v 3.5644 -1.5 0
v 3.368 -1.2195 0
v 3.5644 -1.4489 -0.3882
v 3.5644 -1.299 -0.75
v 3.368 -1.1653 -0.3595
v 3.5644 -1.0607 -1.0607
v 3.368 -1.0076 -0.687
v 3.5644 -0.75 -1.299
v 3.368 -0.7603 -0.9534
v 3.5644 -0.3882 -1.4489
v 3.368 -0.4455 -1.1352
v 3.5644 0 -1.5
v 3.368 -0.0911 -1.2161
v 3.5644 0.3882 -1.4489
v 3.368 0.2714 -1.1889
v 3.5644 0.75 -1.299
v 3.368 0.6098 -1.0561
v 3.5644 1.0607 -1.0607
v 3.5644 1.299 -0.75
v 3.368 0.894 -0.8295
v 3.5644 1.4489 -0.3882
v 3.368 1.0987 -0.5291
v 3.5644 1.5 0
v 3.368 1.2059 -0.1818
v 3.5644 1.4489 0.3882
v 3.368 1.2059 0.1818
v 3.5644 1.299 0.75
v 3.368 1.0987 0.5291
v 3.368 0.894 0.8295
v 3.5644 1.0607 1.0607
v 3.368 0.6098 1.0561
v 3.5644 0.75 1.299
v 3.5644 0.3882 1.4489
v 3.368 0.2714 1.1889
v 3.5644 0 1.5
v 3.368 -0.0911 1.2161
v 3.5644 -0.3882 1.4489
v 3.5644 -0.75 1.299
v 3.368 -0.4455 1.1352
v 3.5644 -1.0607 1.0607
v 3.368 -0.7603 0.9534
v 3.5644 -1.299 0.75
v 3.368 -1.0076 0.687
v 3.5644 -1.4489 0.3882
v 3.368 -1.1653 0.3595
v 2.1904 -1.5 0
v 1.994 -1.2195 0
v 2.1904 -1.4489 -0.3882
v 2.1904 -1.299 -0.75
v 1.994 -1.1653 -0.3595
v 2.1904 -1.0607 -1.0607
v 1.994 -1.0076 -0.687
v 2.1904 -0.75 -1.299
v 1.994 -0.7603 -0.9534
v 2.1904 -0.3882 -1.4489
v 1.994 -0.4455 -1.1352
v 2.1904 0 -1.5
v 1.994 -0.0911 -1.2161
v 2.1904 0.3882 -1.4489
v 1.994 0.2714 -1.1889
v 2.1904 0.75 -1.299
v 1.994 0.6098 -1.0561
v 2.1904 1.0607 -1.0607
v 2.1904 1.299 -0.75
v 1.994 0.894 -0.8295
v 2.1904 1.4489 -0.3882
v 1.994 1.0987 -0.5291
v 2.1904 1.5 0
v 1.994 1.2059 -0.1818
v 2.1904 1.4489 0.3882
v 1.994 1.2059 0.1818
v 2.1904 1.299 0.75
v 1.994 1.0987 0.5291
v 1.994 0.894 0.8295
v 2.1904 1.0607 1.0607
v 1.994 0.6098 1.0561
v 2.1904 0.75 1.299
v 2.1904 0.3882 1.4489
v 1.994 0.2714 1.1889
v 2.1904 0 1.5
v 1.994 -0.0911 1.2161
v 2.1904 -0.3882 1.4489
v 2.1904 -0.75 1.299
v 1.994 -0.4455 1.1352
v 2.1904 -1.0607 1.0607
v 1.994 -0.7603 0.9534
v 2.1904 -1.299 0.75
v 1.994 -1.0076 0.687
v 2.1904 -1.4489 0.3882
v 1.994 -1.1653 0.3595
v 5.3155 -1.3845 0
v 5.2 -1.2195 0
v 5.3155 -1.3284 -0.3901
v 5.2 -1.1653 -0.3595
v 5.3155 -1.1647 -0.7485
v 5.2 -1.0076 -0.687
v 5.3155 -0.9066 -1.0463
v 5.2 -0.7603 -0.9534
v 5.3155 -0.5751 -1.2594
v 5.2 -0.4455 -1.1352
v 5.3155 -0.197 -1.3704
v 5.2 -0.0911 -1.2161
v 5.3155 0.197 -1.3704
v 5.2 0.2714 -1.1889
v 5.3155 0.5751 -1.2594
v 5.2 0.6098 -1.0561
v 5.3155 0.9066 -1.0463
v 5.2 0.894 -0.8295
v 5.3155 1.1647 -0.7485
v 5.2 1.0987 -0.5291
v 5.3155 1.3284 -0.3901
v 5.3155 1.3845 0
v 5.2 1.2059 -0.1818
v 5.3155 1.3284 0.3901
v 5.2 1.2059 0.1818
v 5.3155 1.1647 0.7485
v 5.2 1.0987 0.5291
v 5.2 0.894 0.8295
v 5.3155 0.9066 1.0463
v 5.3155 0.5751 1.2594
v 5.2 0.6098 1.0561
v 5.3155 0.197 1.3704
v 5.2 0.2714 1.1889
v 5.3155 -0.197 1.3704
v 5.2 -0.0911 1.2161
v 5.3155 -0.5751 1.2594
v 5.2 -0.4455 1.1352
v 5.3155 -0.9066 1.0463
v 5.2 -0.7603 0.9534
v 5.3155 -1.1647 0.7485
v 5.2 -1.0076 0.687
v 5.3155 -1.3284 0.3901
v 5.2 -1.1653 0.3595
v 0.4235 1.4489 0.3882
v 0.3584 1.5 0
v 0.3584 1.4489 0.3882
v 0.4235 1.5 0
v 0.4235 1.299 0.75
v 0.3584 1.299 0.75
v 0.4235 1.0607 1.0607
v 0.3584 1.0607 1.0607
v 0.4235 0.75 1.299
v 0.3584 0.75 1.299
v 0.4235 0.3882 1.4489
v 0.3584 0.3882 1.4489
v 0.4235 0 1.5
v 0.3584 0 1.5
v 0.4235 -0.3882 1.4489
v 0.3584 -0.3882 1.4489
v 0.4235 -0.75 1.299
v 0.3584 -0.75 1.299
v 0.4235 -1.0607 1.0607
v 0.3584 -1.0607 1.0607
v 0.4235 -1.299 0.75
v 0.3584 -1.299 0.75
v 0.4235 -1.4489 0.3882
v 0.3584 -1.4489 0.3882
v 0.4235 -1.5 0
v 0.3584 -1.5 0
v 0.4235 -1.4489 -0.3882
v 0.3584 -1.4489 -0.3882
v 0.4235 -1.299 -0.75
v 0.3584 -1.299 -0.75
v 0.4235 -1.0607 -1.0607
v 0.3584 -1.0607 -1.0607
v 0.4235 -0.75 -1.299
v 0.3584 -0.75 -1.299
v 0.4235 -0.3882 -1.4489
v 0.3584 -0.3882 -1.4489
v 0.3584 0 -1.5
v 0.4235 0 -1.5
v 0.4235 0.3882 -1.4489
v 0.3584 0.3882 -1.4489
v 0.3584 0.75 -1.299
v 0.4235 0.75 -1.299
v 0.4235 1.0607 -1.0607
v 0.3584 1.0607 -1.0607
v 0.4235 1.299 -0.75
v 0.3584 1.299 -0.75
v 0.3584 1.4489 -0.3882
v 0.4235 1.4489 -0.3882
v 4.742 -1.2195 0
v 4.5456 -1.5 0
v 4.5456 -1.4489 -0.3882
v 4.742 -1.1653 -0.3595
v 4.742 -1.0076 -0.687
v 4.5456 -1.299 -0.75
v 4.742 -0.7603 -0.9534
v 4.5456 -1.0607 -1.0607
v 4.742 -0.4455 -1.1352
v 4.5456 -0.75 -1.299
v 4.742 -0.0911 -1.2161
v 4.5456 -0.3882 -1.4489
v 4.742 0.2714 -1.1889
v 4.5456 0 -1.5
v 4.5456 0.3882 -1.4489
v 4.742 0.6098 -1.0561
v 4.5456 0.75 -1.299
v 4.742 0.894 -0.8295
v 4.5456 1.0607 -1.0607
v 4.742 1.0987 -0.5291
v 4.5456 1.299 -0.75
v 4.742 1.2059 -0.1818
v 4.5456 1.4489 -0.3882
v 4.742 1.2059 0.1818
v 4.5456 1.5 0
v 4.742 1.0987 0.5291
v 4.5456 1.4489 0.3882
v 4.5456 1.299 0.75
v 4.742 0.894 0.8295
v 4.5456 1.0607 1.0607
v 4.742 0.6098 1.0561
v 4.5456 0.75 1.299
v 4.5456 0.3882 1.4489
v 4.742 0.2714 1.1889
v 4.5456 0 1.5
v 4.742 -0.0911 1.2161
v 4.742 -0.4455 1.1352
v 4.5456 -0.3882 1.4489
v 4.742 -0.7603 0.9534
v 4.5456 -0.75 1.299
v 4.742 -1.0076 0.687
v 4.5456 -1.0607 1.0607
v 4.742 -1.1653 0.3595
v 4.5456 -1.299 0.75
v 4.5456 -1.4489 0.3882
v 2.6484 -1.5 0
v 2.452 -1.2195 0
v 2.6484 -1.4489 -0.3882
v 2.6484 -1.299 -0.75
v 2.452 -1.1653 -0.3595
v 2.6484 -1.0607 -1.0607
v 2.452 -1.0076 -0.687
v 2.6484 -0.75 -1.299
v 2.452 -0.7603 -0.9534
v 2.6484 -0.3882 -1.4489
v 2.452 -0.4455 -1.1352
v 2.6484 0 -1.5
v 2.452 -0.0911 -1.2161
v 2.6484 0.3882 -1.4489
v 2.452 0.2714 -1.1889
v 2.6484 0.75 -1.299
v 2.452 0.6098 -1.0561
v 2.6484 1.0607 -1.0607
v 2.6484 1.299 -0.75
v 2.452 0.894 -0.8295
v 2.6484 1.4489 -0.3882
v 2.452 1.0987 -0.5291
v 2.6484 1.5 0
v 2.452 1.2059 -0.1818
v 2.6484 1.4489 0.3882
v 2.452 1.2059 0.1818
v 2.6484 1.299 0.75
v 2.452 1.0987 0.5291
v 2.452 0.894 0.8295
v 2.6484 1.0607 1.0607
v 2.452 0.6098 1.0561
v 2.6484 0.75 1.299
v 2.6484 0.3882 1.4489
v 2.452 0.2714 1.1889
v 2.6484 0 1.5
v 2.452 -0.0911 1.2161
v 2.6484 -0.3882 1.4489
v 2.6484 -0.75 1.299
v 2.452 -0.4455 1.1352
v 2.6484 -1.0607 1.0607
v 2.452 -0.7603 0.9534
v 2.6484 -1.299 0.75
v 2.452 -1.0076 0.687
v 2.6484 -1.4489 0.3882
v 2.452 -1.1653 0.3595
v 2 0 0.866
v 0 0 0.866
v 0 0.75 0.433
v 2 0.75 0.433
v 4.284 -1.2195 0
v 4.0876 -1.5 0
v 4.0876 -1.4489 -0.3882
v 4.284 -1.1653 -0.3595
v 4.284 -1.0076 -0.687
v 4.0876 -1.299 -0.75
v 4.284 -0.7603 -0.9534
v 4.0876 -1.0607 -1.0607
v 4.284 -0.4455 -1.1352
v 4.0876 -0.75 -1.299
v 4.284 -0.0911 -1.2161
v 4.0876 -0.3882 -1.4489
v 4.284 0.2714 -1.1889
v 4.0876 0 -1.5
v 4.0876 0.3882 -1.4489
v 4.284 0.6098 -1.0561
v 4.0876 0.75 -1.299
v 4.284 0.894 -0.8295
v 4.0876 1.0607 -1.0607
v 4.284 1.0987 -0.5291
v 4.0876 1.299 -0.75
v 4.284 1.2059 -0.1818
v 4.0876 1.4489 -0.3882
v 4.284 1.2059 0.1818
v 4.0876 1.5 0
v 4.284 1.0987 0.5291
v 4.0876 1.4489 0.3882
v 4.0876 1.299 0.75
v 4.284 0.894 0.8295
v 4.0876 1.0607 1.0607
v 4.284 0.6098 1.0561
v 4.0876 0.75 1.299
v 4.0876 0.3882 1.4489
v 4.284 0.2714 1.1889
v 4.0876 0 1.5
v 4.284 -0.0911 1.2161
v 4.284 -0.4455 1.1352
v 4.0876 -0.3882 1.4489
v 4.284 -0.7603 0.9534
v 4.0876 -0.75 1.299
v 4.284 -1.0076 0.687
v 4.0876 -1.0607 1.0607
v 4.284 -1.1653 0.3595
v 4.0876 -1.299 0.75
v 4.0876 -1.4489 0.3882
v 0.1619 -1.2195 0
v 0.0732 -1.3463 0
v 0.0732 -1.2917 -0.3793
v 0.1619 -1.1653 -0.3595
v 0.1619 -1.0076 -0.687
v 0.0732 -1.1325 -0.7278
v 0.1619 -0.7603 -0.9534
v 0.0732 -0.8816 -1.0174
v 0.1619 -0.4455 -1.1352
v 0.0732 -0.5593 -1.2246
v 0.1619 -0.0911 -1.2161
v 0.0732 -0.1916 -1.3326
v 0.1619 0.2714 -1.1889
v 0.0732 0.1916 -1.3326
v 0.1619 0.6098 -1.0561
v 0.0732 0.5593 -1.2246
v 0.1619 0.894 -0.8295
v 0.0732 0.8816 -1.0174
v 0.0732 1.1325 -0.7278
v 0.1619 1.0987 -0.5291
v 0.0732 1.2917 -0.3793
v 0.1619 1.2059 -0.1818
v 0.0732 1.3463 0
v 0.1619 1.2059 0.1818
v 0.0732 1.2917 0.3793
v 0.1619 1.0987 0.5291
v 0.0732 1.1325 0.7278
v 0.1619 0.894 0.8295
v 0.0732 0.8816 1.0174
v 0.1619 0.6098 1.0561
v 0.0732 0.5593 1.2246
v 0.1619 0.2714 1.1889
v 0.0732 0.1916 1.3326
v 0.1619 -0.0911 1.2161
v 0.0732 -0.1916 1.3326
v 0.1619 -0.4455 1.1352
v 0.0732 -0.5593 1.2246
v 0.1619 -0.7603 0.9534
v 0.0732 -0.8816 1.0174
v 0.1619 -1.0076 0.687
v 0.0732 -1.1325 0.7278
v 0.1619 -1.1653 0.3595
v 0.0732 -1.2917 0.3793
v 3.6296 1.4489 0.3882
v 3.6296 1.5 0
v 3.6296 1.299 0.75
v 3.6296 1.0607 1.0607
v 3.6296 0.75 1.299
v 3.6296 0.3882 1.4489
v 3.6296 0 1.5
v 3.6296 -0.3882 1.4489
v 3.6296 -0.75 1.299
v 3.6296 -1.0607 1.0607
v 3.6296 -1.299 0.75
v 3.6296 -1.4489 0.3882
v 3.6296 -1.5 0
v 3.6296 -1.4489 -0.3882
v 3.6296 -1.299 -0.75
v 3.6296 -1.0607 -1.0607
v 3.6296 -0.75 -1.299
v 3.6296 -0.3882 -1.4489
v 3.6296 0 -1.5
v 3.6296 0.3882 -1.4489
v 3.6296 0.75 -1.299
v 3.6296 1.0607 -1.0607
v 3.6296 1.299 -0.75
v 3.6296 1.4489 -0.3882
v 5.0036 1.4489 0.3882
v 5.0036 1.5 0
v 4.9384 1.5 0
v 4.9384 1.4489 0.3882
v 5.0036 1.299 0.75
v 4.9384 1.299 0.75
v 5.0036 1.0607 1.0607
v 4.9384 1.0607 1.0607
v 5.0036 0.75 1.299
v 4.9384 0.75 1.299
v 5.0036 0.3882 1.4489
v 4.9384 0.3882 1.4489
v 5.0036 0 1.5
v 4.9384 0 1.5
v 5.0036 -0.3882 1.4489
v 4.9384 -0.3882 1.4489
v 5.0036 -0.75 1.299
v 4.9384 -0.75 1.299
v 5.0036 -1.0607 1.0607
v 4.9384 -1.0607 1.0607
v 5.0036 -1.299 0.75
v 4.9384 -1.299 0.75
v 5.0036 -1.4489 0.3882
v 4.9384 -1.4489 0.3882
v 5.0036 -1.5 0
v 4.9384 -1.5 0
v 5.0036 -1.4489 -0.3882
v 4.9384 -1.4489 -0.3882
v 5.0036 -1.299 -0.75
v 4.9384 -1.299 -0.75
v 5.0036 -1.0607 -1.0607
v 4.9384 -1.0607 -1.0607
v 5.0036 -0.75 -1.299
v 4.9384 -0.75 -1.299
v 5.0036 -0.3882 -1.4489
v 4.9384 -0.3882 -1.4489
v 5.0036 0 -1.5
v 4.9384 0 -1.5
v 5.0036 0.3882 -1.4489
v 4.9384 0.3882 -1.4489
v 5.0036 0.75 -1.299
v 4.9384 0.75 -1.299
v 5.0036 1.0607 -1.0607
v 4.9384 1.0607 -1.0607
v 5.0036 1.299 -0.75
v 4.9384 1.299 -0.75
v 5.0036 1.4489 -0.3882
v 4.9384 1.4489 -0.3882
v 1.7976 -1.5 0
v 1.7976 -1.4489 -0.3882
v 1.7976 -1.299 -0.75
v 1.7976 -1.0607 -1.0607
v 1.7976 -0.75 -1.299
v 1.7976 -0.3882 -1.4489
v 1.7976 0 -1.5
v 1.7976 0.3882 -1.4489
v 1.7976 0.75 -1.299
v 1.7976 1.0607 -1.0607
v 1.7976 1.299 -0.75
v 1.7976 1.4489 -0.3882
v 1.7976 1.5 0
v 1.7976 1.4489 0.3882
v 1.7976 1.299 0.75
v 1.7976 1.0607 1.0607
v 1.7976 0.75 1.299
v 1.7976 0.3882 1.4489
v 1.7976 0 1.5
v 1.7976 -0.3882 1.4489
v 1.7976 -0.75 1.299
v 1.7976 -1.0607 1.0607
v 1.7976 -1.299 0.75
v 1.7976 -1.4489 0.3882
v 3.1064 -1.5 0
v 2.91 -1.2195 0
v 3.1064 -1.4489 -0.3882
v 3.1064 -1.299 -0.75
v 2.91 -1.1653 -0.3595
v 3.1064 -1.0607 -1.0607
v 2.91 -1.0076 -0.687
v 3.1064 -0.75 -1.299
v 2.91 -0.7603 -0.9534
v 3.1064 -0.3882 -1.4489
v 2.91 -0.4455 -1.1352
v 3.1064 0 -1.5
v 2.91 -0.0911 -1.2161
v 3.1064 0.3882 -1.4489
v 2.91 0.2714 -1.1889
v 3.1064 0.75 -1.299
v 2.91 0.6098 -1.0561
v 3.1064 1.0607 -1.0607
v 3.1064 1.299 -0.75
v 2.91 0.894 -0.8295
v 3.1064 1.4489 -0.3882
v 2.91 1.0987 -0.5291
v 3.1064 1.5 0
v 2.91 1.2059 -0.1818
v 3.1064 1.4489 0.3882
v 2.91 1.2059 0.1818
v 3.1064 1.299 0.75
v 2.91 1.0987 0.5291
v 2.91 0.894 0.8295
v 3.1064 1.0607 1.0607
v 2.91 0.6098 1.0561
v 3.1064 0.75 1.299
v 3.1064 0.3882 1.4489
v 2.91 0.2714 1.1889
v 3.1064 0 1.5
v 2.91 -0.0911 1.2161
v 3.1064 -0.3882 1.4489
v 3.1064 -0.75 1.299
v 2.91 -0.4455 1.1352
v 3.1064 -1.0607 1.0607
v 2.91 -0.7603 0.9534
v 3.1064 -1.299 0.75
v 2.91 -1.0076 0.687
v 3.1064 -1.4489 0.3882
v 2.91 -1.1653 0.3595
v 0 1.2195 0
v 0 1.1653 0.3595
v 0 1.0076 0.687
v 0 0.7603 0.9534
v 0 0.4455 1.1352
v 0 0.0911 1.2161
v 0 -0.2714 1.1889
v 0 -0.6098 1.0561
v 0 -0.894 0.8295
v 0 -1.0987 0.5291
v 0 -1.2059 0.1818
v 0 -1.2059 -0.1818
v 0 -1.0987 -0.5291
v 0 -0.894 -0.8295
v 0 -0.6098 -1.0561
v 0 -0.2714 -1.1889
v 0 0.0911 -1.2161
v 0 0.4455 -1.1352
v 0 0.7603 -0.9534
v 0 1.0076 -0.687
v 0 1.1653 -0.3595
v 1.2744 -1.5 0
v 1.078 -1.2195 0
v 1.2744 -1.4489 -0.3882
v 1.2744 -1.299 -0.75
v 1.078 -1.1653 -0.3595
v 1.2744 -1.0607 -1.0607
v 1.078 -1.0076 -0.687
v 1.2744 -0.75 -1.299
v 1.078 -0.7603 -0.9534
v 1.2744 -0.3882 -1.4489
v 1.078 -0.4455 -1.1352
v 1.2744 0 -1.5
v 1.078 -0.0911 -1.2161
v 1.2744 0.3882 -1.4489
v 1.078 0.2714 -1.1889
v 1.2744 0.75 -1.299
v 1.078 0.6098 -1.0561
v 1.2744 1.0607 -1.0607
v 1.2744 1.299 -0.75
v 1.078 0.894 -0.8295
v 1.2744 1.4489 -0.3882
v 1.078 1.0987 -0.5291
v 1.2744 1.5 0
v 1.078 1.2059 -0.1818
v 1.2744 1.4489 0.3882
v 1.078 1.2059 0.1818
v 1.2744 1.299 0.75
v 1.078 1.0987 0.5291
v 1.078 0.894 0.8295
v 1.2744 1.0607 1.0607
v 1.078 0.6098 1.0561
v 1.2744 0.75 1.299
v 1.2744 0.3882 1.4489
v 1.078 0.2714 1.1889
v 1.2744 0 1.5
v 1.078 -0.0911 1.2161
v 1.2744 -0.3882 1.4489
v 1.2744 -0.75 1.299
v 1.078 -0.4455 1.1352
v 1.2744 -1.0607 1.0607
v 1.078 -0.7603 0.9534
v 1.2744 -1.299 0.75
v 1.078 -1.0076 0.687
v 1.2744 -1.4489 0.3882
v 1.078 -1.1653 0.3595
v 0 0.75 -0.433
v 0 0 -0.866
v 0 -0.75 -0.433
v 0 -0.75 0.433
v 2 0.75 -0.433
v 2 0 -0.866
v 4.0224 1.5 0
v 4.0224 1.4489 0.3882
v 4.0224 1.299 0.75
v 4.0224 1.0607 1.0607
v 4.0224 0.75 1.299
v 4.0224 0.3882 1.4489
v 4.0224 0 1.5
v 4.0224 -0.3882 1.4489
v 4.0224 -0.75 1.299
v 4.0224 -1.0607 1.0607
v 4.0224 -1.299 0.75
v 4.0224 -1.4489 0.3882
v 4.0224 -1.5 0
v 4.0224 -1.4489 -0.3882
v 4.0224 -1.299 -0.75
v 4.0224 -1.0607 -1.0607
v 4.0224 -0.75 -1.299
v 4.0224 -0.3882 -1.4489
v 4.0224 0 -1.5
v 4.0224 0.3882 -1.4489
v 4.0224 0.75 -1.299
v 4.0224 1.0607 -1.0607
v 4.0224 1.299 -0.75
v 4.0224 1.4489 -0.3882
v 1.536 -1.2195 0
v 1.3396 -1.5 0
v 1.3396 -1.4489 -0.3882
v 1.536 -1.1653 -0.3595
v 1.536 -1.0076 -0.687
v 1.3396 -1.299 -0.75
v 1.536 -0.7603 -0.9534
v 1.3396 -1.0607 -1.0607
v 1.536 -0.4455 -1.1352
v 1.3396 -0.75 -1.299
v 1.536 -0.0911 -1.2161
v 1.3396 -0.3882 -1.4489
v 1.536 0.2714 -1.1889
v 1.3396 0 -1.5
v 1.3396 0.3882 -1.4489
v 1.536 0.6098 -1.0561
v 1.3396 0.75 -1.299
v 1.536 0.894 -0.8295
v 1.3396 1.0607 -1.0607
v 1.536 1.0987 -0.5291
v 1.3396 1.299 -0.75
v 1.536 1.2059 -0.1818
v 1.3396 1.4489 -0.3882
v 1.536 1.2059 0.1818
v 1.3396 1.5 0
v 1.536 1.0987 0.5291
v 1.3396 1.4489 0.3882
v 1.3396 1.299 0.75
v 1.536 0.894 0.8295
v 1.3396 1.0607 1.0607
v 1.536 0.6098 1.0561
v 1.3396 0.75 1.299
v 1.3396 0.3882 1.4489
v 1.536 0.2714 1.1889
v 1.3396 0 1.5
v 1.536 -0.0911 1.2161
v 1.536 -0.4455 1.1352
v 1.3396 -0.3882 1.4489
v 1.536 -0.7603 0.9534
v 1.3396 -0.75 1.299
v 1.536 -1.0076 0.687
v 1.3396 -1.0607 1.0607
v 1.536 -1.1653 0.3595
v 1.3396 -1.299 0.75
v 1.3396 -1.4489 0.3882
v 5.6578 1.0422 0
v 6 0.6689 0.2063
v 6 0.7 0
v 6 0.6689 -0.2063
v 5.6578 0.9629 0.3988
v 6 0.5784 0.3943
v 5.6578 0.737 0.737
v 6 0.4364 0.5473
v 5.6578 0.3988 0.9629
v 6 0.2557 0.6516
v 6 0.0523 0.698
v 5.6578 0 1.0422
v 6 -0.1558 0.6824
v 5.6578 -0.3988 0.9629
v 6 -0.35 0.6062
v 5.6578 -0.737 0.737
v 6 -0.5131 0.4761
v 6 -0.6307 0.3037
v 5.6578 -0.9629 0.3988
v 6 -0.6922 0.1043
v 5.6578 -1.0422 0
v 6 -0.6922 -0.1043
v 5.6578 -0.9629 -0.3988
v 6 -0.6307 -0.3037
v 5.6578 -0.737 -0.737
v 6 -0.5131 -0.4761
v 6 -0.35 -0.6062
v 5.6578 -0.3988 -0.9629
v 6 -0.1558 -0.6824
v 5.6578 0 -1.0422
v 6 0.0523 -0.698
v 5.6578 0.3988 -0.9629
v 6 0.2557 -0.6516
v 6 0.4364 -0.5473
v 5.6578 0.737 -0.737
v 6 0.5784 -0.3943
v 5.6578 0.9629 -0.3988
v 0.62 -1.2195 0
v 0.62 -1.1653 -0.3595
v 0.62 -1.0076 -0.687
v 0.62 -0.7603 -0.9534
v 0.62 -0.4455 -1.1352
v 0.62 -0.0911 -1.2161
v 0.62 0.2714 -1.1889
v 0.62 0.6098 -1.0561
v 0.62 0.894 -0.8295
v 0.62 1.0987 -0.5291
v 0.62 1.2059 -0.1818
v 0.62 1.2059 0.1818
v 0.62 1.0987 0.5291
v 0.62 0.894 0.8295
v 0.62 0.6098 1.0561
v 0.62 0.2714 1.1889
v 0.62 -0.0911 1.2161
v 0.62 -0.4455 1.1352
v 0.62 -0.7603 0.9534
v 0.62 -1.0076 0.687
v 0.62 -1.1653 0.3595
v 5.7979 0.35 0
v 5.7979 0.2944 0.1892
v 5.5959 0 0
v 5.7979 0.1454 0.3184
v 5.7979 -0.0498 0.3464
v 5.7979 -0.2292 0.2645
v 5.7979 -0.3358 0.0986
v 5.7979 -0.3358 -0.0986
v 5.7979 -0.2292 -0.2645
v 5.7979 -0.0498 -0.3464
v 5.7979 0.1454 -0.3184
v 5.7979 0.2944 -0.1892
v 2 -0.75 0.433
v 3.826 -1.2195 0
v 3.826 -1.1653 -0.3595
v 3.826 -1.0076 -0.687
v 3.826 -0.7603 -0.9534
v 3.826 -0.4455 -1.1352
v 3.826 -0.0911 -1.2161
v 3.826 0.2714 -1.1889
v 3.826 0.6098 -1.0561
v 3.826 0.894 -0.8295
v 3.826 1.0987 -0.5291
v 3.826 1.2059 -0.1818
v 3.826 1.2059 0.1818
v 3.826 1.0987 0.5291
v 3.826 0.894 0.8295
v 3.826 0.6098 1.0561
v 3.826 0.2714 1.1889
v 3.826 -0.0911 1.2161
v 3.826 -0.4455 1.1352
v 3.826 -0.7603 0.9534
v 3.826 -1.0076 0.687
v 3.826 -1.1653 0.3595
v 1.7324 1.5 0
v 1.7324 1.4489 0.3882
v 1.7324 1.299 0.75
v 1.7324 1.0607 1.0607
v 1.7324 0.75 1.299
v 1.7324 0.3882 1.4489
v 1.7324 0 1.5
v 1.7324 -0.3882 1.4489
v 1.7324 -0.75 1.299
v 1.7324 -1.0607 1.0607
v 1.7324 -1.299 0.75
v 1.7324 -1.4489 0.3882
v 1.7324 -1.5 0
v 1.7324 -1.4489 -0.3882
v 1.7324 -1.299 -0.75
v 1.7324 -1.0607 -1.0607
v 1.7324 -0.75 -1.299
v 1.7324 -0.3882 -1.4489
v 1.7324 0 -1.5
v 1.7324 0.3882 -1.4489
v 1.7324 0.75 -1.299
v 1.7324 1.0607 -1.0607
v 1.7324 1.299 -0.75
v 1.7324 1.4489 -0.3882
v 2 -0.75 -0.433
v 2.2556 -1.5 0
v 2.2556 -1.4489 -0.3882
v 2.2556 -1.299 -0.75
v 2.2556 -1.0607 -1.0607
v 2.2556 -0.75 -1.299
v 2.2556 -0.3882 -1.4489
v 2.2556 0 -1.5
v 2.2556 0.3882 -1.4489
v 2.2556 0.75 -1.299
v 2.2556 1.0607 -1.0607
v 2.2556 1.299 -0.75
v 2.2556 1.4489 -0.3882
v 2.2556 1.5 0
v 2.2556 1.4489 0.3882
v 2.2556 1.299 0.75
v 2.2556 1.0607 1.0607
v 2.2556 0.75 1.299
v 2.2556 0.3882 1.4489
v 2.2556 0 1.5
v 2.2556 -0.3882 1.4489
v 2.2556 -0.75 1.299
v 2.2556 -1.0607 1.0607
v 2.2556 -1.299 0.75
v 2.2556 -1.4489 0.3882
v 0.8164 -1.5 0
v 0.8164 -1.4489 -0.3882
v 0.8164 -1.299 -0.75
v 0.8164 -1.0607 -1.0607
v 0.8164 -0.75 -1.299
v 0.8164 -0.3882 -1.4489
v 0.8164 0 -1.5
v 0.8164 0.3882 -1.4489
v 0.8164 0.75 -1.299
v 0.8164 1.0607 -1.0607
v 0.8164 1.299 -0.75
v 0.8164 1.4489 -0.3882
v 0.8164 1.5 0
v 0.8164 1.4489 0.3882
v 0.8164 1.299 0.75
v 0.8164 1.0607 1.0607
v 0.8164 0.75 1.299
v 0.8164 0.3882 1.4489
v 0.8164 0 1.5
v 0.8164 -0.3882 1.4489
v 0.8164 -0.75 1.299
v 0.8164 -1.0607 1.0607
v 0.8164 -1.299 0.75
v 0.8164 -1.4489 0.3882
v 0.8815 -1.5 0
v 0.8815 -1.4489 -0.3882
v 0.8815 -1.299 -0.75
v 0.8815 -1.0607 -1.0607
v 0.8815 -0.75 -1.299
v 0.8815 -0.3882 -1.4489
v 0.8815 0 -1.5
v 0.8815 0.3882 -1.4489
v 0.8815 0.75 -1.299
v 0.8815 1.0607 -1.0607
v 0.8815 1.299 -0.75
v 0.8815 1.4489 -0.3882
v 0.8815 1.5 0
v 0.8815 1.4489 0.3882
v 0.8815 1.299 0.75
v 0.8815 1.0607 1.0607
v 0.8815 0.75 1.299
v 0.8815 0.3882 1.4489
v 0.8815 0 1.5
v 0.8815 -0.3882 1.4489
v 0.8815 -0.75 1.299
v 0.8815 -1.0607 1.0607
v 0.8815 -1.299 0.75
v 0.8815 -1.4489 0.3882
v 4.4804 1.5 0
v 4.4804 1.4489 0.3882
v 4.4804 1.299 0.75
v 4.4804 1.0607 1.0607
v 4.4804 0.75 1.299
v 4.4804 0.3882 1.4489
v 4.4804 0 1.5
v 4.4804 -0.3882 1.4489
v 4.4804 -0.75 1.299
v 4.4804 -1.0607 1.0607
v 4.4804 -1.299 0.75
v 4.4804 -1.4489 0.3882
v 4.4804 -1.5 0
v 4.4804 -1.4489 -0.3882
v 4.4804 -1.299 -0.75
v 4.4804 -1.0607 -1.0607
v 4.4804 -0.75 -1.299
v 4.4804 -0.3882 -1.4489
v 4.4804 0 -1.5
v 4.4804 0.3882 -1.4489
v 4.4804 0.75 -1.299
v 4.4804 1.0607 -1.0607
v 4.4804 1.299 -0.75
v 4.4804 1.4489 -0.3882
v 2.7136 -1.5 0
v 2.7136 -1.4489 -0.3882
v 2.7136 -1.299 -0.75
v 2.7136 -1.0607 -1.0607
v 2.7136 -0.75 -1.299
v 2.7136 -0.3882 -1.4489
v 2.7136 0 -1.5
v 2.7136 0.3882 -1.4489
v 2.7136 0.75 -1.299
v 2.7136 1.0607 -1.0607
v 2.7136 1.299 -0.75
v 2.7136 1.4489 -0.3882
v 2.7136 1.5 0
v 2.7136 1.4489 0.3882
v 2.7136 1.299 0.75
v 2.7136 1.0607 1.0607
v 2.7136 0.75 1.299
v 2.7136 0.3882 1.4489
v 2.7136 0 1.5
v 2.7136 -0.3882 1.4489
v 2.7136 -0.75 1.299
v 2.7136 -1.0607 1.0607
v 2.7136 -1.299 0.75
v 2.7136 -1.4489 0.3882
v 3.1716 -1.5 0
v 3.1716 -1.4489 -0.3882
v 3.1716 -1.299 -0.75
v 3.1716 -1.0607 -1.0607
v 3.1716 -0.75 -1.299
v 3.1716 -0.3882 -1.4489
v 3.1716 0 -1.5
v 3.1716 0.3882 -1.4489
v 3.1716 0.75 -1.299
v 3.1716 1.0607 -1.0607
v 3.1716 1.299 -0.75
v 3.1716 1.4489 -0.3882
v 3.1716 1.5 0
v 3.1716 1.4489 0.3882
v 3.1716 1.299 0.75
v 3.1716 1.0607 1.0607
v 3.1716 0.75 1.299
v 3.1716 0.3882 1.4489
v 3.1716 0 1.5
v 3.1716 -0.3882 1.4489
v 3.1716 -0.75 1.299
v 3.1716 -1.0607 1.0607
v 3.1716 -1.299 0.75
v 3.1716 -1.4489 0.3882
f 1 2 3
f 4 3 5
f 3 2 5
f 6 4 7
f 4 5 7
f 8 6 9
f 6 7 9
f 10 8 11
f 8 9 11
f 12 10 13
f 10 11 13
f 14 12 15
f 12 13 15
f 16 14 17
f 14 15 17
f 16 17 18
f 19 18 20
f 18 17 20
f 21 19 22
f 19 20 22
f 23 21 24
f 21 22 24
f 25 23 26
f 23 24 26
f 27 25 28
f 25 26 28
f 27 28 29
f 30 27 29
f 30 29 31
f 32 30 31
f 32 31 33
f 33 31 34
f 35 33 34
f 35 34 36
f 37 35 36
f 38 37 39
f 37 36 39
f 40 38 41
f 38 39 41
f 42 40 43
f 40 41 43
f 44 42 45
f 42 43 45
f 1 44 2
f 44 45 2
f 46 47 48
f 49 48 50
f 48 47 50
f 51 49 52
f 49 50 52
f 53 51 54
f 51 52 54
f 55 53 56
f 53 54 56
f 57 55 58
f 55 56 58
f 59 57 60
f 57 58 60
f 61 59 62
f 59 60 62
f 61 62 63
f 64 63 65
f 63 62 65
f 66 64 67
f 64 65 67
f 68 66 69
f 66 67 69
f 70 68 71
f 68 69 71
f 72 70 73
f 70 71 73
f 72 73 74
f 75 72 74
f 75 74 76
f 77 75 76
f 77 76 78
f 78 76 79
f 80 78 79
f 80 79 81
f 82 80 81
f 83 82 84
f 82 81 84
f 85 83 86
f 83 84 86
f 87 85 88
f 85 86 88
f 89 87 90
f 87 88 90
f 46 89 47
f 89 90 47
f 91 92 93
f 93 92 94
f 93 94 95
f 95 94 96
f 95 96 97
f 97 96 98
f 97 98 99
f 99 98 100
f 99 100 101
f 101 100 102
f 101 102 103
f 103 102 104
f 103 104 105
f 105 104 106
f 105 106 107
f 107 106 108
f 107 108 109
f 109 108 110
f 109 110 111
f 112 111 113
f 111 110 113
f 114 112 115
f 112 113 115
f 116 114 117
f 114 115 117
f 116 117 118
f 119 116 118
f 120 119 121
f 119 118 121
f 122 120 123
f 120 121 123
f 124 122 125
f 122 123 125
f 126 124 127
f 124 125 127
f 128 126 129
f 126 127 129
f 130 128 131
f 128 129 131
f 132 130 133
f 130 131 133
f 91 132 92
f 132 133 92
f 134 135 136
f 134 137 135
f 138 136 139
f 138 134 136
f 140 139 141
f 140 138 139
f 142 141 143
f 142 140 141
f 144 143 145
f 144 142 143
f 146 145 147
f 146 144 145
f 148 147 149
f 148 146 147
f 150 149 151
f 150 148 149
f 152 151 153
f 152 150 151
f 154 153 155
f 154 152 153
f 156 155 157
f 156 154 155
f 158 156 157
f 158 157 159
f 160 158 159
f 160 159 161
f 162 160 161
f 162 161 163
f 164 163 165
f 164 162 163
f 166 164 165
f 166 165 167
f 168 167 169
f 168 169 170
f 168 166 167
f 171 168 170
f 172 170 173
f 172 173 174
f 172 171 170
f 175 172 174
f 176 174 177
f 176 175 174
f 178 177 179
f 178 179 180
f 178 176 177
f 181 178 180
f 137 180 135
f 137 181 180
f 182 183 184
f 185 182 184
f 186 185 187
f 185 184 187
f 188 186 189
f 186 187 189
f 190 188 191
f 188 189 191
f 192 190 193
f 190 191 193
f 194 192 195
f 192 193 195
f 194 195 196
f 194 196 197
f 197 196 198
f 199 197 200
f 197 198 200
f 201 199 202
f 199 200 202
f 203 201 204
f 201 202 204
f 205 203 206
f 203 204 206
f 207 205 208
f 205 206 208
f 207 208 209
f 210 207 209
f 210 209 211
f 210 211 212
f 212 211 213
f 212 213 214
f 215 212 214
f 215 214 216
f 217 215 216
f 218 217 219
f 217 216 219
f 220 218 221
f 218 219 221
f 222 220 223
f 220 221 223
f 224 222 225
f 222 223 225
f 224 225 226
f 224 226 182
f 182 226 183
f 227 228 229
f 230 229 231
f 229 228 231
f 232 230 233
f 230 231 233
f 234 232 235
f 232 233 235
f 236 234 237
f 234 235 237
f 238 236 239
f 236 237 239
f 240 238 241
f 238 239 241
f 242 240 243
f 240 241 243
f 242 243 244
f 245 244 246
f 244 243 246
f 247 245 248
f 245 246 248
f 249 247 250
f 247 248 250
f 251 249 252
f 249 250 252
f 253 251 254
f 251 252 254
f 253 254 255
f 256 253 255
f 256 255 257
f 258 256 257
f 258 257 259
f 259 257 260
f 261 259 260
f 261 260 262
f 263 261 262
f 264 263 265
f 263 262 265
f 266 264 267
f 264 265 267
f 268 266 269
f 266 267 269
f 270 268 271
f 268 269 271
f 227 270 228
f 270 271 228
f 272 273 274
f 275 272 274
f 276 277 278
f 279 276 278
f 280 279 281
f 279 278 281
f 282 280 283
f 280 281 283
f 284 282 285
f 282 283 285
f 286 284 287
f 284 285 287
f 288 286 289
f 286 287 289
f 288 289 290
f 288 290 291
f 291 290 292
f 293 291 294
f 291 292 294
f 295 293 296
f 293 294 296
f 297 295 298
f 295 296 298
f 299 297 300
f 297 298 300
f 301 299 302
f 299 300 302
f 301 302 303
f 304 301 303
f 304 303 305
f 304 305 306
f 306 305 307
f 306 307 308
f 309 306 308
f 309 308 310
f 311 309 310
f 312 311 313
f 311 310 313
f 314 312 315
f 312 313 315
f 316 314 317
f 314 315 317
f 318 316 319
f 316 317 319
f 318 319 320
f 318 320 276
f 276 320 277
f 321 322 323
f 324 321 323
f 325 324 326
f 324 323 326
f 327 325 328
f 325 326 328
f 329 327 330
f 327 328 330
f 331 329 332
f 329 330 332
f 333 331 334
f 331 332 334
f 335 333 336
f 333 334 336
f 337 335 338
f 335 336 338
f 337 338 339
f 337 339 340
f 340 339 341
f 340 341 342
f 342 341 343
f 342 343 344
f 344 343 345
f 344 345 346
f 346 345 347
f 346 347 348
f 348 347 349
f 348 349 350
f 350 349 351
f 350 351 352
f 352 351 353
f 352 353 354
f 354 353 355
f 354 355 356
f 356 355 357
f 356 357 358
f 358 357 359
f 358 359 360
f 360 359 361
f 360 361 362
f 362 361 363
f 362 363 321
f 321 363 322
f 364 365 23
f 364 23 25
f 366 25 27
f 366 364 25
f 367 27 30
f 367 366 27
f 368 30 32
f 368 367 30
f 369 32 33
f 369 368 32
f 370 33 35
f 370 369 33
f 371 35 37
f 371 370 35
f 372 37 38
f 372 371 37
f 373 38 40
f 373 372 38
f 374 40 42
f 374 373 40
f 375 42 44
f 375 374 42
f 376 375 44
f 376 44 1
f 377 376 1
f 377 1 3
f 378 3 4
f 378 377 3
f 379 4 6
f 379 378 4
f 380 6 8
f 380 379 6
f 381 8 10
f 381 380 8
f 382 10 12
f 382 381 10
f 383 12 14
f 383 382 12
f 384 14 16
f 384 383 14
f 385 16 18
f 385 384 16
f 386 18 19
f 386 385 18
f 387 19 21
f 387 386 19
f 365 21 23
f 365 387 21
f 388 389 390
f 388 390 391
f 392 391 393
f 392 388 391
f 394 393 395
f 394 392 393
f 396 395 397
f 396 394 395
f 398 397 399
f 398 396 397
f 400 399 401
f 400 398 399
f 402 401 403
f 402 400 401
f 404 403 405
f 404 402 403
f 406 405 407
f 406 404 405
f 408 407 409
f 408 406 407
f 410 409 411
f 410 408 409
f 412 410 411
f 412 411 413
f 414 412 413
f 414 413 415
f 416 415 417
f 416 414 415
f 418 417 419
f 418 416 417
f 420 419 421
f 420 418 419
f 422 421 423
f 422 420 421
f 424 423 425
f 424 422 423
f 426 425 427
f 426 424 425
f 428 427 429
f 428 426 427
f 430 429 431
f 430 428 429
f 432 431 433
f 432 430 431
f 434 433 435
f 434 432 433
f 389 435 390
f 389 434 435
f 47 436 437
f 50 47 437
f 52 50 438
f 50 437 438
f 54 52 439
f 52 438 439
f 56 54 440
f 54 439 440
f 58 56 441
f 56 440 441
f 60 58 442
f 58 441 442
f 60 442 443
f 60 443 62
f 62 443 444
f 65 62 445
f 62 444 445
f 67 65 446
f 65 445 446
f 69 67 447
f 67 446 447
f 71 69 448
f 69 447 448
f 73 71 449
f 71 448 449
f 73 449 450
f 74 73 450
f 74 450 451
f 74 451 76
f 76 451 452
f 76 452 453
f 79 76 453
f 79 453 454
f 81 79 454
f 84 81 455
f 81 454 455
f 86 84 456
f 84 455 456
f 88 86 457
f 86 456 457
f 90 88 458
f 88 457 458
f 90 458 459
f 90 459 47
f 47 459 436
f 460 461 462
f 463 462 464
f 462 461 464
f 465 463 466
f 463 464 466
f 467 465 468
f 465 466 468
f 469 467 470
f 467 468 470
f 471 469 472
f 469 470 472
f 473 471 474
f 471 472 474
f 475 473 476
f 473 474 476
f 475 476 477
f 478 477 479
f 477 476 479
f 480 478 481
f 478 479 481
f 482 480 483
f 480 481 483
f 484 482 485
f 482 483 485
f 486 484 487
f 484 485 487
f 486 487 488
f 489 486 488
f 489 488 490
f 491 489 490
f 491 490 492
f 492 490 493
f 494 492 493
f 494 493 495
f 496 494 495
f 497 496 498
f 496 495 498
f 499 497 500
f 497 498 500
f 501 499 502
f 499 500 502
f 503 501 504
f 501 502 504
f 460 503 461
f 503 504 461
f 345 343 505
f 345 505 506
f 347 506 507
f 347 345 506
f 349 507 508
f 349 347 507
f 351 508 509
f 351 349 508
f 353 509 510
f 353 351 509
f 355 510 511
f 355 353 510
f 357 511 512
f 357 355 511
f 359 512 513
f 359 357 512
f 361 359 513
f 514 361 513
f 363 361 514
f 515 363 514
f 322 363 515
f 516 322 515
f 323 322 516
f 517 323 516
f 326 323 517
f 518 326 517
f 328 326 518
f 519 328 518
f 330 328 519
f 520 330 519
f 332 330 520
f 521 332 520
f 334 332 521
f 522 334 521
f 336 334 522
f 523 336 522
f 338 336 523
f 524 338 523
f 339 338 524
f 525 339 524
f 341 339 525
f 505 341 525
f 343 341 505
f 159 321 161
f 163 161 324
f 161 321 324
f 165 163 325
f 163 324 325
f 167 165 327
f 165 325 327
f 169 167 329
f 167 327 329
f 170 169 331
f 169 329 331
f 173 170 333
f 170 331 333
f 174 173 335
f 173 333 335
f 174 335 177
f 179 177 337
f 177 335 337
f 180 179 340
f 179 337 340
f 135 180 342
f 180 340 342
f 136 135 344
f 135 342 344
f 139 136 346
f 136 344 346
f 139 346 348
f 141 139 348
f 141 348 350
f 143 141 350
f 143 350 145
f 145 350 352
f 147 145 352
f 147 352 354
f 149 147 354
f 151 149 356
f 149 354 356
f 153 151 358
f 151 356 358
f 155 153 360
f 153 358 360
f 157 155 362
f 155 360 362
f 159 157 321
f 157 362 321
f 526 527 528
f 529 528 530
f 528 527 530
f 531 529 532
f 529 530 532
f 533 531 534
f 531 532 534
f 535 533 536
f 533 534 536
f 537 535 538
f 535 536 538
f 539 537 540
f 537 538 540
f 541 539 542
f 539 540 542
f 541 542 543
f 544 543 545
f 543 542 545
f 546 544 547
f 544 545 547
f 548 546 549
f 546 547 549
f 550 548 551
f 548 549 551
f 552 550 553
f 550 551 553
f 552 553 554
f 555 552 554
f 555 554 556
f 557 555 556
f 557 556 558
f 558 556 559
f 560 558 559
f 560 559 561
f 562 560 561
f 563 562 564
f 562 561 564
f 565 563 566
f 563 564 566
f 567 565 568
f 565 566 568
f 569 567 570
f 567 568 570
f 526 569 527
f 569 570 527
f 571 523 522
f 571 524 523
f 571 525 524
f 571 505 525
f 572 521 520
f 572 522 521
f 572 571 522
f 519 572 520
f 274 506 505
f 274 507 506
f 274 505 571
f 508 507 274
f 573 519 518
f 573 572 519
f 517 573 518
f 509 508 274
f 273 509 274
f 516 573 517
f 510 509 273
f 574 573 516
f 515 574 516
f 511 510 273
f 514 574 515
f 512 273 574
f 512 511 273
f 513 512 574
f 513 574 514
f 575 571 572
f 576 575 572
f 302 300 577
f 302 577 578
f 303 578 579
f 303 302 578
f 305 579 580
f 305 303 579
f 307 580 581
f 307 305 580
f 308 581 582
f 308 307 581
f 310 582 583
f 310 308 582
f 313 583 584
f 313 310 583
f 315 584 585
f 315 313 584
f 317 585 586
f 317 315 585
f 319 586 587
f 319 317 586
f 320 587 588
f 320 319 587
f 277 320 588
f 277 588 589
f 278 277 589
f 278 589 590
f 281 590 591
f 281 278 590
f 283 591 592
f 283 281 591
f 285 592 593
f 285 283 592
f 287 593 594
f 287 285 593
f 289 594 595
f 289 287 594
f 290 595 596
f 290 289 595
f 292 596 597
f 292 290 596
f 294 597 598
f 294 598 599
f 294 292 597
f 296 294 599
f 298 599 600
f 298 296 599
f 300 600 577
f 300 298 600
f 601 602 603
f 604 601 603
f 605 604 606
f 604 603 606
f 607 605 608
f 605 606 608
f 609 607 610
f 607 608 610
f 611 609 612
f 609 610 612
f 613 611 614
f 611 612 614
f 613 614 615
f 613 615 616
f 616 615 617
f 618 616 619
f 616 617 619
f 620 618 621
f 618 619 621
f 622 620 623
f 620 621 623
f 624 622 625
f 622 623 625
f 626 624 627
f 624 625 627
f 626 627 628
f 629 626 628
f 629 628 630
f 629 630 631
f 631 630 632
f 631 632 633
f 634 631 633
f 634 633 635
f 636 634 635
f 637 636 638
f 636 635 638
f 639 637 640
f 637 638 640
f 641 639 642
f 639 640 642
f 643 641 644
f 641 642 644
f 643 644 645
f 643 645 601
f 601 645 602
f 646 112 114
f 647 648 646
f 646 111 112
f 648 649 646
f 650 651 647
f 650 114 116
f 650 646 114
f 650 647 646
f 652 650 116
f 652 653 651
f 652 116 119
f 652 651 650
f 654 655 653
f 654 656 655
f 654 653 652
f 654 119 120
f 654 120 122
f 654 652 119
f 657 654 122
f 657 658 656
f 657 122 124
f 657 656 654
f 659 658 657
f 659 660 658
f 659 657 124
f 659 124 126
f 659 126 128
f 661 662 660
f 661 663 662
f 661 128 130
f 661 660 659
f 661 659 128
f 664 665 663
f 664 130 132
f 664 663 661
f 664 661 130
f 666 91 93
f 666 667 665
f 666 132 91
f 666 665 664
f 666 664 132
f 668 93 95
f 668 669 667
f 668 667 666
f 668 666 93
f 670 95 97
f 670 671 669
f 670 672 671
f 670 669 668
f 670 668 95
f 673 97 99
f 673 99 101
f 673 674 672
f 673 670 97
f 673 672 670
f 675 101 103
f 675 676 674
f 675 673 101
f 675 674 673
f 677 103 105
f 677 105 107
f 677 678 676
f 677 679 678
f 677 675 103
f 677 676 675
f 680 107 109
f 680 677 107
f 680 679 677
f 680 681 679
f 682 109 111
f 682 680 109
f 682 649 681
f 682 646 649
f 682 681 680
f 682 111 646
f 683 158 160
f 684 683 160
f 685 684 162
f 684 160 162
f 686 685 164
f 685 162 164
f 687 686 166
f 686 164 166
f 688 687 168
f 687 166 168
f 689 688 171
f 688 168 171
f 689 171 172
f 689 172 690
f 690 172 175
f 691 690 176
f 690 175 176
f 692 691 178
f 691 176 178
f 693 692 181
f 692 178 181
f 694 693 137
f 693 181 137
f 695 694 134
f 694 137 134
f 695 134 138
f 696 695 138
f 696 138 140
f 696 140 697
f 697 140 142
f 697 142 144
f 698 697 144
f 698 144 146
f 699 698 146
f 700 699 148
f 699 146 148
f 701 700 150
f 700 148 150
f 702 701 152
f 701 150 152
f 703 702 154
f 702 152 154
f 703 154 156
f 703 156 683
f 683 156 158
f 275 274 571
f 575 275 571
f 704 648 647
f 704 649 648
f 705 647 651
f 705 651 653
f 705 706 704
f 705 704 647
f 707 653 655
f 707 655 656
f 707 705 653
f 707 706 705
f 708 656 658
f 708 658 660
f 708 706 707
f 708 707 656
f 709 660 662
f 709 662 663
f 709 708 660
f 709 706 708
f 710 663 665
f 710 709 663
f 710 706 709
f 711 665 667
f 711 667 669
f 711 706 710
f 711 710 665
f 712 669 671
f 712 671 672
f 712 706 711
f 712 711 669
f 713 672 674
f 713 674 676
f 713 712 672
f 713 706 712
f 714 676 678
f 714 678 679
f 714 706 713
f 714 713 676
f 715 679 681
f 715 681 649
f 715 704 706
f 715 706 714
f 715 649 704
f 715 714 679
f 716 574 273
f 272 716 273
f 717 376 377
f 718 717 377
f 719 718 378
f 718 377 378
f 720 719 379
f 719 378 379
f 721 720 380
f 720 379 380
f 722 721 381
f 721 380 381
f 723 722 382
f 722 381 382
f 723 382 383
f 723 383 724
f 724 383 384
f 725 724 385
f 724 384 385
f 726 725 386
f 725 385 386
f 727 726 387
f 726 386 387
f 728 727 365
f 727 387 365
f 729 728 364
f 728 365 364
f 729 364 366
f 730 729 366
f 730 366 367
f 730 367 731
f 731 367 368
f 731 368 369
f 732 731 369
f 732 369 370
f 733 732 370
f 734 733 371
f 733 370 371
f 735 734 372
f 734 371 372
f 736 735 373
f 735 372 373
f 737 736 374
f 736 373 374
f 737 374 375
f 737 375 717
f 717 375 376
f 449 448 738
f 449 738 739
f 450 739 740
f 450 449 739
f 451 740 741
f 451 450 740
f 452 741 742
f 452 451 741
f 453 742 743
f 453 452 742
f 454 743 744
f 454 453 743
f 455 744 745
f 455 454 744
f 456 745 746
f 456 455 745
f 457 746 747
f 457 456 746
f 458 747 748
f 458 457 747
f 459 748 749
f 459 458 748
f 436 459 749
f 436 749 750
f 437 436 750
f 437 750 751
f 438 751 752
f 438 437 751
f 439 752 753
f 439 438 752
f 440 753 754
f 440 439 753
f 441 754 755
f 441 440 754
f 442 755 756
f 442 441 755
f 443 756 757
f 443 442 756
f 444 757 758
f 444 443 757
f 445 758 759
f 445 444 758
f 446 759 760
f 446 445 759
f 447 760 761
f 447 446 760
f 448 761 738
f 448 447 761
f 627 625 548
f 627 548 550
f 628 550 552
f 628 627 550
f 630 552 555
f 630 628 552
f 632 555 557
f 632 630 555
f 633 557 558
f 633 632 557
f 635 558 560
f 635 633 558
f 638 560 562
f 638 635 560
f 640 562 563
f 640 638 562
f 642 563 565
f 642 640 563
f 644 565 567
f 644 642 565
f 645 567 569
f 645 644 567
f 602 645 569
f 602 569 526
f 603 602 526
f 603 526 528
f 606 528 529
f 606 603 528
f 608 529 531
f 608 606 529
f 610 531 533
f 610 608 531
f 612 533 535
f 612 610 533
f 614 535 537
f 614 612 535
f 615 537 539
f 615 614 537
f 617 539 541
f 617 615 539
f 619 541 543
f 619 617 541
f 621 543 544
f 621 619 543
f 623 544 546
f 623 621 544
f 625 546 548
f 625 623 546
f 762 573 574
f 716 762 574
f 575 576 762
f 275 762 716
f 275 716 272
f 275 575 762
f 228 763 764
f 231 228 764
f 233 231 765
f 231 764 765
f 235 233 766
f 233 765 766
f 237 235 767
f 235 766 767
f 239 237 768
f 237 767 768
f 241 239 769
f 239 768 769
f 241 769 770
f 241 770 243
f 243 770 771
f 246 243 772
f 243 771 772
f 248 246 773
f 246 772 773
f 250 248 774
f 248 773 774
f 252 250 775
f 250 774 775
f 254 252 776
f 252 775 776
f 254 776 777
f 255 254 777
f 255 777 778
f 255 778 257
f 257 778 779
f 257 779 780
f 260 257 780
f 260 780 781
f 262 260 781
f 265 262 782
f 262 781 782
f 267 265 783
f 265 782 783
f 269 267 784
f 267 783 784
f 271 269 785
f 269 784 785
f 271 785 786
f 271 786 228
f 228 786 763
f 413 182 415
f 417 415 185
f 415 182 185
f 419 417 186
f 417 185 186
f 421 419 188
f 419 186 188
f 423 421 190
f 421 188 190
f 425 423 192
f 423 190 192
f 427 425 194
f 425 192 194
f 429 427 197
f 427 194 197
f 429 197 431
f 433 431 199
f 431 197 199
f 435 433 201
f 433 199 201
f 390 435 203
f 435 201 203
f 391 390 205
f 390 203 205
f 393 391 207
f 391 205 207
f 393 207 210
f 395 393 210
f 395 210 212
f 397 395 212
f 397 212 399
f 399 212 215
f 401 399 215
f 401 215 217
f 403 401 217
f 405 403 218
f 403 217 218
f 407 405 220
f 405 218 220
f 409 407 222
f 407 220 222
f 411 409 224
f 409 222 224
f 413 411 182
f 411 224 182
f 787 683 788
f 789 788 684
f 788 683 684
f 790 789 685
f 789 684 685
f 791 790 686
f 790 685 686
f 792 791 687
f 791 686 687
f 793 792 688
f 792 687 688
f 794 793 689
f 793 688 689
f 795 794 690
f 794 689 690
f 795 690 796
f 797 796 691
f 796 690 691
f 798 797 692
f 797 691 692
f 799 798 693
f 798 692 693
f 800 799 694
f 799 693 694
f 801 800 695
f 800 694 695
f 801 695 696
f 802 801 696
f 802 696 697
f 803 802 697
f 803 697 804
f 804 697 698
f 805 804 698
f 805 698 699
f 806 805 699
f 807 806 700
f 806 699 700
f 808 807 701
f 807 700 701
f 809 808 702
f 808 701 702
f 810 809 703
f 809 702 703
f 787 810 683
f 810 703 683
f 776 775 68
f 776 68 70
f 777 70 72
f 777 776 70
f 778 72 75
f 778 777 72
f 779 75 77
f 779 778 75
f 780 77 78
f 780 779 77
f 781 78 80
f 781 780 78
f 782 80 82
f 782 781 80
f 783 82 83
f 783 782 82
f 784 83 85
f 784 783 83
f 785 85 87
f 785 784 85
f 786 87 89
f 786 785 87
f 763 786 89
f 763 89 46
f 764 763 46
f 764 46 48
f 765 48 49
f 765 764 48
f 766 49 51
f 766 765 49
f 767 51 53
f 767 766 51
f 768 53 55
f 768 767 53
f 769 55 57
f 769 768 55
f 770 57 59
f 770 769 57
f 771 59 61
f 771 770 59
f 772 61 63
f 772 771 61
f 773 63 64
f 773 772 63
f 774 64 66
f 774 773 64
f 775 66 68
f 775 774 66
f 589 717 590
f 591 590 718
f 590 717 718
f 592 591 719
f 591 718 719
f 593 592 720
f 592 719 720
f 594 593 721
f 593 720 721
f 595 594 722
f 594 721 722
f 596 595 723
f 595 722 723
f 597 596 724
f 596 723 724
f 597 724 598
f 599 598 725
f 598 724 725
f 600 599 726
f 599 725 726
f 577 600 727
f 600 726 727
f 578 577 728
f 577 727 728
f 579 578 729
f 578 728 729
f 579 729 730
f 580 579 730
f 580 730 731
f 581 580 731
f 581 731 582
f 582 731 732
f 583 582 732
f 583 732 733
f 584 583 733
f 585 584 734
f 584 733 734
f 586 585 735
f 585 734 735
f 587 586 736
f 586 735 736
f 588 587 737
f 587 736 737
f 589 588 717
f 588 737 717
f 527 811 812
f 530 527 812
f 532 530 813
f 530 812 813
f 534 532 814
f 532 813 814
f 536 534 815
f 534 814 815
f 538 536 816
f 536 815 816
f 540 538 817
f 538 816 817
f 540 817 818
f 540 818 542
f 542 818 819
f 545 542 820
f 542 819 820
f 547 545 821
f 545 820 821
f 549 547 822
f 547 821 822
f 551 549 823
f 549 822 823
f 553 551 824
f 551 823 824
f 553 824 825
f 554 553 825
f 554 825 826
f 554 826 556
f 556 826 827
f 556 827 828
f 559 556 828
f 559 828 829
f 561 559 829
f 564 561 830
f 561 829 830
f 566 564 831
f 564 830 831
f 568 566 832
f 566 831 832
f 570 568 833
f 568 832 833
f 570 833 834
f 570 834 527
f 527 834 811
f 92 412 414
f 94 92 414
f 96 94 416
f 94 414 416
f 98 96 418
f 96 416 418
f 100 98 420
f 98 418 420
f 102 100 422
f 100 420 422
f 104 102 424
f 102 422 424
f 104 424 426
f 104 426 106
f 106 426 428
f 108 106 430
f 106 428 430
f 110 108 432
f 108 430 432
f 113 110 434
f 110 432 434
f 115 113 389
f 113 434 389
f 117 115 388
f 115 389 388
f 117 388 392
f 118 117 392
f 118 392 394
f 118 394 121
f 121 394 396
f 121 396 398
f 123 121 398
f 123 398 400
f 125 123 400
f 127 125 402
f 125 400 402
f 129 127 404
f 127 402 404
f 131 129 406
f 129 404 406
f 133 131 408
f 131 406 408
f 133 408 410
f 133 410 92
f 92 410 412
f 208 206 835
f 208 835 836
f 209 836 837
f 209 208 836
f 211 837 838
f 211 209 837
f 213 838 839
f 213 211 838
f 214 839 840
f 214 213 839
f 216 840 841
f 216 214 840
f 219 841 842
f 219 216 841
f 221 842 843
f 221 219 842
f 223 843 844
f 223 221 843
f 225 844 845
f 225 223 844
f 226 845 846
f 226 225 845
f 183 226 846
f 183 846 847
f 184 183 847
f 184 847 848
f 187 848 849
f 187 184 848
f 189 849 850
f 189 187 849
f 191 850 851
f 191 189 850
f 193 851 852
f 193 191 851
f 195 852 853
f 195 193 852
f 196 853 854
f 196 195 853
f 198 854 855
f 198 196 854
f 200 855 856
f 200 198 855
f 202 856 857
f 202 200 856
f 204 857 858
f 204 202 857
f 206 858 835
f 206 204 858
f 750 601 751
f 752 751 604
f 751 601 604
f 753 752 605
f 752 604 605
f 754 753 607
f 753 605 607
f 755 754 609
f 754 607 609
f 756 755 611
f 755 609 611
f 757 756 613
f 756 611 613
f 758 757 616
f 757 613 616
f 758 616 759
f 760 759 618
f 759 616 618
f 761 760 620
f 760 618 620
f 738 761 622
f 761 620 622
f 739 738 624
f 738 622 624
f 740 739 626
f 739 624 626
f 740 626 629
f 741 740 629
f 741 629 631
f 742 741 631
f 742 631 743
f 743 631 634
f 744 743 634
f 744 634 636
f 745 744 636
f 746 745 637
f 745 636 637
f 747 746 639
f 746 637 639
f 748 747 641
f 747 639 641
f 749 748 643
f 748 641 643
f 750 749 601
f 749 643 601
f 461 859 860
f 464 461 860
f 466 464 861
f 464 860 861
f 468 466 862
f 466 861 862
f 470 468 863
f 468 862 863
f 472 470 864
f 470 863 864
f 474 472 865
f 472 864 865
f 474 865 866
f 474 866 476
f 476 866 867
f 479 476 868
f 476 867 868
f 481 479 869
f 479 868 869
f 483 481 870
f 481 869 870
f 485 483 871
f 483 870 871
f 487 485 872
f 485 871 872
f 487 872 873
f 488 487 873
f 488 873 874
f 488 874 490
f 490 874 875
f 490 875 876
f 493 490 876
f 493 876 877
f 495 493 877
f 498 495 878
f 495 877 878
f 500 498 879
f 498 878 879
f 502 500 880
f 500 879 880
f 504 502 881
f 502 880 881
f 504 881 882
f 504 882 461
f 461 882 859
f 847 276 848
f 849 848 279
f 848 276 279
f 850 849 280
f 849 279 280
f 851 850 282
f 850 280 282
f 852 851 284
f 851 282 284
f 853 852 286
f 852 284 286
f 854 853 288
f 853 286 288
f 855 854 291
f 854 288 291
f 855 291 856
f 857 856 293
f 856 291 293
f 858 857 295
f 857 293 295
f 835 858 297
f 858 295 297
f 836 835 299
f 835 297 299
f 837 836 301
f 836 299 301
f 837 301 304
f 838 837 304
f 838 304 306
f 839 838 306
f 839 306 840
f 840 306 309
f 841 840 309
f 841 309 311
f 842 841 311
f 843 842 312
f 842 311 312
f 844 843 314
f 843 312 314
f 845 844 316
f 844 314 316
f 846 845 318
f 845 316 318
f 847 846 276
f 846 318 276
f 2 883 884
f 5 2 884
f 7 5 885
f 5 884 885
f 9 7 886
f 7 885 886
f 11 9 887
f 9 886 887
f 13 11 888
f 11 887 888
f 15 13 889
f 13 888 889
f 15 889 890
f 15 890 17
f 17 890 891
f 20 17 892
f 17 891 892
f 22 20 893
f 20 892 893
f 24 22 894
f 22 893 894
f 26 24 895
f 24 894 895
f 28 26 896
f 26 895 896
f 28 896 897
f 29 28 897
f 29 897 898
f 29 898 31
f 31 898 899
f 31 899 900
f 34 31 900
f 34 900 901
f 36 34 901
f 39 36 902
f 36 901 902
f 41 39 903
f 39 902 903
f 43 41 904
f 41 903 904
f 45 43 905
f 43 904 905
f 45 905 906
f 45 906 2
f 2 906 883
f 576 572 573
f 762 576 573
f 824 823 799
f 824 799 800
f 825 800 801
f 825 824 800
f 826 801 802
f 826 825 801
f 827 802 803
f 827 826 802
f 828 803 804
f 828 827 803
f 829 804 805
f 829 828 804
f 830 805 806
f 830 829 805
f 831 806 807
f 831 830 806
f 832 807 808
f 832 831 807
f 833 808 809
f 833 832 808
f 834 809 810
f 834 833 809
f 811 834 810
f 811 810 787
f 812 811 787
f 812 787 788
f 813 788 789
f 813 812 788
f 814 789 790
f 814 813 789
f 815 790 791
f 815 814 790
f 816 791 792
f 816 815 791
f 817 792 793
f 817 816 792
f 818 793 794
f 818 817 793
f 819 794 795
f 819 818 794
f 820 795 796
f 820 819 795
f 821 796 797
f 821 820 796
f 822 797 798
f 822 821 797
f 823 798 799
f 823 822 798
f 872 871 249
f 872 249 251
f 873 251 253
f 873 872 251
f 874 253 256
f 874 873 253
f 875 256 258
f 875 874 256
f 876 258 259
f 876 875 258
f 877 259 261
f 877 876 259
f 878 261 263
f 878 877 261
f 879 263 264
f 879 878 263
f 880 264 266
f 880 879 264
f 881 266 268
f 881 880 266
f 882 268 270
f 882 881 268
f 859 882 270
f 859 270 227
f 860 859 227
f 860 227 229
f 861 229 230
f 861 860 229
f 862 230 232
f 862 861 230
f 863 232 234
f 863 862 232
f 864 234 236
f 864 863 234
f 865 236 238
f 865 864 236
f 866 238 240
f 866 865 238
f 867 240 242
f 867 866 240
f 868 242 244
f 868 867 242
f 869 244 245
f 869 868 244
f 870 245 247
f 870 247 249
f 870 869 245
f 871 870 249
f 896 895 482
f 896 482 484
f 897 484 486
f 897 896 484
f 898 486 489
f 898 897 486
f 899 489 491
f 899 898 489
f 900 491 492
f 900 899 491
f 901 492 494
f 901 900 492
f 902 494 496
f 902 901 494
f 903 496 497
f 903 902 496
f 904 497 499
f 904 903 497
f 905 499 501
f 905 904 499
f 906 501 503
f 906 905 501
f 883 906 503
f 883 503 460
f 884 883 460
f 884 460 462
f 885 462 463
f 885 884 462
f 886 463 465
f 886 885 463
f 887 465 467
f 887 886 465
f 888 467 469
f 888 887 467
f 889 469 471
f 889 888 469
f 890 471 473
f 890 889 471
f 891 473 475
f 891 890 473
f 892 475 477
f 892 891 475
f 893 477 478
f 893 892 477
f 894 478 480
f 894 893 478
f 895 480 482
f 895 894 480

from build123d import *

# Parameters (mm, degrees)
HEX_2_DEPTH     = 2
THDSCHPAT_COUNT = 12
THDSCHPAT_PITCH = 0.458004843


with BuildPart() as part:
    # BodySke → BaseBody (revolve)
    with BuildSketch(Plane.XY):
        Polygon((0, 0), (0, 1.2195), (0.161946751, 1.5), (5.2, 1.5), (6, 0.7), (5.595854812, 0), align=None)
    revolve(axis=Axis((-12.7, 0, 0), (1, 0, 0)))

    # Sketch2 → Hex 2 (cut)
    with BuildSketch(Plane.ZY):
        Polygon((0.433012702, 0.75), (-0.433012702, 0.75), (-0.866025404, 0), (-0.433012702, -0.75), (0.433012702, -0.75), (0.866025404, 0), align=None)
    extrude(amount=-HEX_2_DEPTH, mode=Mode.SUBTRACT)

    # ThdSchSke → ThreadSchematic (revolve, cut)
    with BuildSketch(Plane.XY):
        Polygon((0.161946751, -1.2195), (-0.034461464, -1.5), (-0.034461464, -1.875), (0.358354965, -1.875), (0.358354965, -1.5), align=None)
    threadschematic = revolve(axis=Axis((-3.175, 0, 0), (1, 0, 0)), mode=Mode.SUBTRACT)

    # ThdSchPat: ThreadSchematic ×12
    with Locations(*[(i * THDSCHPAT_PITCH, 0, 0) for i in range(1, THDSCHPAT_COUNT)]):
        add(threadschematic, mode=Mode.SUBTRACT)


solid = part.part
